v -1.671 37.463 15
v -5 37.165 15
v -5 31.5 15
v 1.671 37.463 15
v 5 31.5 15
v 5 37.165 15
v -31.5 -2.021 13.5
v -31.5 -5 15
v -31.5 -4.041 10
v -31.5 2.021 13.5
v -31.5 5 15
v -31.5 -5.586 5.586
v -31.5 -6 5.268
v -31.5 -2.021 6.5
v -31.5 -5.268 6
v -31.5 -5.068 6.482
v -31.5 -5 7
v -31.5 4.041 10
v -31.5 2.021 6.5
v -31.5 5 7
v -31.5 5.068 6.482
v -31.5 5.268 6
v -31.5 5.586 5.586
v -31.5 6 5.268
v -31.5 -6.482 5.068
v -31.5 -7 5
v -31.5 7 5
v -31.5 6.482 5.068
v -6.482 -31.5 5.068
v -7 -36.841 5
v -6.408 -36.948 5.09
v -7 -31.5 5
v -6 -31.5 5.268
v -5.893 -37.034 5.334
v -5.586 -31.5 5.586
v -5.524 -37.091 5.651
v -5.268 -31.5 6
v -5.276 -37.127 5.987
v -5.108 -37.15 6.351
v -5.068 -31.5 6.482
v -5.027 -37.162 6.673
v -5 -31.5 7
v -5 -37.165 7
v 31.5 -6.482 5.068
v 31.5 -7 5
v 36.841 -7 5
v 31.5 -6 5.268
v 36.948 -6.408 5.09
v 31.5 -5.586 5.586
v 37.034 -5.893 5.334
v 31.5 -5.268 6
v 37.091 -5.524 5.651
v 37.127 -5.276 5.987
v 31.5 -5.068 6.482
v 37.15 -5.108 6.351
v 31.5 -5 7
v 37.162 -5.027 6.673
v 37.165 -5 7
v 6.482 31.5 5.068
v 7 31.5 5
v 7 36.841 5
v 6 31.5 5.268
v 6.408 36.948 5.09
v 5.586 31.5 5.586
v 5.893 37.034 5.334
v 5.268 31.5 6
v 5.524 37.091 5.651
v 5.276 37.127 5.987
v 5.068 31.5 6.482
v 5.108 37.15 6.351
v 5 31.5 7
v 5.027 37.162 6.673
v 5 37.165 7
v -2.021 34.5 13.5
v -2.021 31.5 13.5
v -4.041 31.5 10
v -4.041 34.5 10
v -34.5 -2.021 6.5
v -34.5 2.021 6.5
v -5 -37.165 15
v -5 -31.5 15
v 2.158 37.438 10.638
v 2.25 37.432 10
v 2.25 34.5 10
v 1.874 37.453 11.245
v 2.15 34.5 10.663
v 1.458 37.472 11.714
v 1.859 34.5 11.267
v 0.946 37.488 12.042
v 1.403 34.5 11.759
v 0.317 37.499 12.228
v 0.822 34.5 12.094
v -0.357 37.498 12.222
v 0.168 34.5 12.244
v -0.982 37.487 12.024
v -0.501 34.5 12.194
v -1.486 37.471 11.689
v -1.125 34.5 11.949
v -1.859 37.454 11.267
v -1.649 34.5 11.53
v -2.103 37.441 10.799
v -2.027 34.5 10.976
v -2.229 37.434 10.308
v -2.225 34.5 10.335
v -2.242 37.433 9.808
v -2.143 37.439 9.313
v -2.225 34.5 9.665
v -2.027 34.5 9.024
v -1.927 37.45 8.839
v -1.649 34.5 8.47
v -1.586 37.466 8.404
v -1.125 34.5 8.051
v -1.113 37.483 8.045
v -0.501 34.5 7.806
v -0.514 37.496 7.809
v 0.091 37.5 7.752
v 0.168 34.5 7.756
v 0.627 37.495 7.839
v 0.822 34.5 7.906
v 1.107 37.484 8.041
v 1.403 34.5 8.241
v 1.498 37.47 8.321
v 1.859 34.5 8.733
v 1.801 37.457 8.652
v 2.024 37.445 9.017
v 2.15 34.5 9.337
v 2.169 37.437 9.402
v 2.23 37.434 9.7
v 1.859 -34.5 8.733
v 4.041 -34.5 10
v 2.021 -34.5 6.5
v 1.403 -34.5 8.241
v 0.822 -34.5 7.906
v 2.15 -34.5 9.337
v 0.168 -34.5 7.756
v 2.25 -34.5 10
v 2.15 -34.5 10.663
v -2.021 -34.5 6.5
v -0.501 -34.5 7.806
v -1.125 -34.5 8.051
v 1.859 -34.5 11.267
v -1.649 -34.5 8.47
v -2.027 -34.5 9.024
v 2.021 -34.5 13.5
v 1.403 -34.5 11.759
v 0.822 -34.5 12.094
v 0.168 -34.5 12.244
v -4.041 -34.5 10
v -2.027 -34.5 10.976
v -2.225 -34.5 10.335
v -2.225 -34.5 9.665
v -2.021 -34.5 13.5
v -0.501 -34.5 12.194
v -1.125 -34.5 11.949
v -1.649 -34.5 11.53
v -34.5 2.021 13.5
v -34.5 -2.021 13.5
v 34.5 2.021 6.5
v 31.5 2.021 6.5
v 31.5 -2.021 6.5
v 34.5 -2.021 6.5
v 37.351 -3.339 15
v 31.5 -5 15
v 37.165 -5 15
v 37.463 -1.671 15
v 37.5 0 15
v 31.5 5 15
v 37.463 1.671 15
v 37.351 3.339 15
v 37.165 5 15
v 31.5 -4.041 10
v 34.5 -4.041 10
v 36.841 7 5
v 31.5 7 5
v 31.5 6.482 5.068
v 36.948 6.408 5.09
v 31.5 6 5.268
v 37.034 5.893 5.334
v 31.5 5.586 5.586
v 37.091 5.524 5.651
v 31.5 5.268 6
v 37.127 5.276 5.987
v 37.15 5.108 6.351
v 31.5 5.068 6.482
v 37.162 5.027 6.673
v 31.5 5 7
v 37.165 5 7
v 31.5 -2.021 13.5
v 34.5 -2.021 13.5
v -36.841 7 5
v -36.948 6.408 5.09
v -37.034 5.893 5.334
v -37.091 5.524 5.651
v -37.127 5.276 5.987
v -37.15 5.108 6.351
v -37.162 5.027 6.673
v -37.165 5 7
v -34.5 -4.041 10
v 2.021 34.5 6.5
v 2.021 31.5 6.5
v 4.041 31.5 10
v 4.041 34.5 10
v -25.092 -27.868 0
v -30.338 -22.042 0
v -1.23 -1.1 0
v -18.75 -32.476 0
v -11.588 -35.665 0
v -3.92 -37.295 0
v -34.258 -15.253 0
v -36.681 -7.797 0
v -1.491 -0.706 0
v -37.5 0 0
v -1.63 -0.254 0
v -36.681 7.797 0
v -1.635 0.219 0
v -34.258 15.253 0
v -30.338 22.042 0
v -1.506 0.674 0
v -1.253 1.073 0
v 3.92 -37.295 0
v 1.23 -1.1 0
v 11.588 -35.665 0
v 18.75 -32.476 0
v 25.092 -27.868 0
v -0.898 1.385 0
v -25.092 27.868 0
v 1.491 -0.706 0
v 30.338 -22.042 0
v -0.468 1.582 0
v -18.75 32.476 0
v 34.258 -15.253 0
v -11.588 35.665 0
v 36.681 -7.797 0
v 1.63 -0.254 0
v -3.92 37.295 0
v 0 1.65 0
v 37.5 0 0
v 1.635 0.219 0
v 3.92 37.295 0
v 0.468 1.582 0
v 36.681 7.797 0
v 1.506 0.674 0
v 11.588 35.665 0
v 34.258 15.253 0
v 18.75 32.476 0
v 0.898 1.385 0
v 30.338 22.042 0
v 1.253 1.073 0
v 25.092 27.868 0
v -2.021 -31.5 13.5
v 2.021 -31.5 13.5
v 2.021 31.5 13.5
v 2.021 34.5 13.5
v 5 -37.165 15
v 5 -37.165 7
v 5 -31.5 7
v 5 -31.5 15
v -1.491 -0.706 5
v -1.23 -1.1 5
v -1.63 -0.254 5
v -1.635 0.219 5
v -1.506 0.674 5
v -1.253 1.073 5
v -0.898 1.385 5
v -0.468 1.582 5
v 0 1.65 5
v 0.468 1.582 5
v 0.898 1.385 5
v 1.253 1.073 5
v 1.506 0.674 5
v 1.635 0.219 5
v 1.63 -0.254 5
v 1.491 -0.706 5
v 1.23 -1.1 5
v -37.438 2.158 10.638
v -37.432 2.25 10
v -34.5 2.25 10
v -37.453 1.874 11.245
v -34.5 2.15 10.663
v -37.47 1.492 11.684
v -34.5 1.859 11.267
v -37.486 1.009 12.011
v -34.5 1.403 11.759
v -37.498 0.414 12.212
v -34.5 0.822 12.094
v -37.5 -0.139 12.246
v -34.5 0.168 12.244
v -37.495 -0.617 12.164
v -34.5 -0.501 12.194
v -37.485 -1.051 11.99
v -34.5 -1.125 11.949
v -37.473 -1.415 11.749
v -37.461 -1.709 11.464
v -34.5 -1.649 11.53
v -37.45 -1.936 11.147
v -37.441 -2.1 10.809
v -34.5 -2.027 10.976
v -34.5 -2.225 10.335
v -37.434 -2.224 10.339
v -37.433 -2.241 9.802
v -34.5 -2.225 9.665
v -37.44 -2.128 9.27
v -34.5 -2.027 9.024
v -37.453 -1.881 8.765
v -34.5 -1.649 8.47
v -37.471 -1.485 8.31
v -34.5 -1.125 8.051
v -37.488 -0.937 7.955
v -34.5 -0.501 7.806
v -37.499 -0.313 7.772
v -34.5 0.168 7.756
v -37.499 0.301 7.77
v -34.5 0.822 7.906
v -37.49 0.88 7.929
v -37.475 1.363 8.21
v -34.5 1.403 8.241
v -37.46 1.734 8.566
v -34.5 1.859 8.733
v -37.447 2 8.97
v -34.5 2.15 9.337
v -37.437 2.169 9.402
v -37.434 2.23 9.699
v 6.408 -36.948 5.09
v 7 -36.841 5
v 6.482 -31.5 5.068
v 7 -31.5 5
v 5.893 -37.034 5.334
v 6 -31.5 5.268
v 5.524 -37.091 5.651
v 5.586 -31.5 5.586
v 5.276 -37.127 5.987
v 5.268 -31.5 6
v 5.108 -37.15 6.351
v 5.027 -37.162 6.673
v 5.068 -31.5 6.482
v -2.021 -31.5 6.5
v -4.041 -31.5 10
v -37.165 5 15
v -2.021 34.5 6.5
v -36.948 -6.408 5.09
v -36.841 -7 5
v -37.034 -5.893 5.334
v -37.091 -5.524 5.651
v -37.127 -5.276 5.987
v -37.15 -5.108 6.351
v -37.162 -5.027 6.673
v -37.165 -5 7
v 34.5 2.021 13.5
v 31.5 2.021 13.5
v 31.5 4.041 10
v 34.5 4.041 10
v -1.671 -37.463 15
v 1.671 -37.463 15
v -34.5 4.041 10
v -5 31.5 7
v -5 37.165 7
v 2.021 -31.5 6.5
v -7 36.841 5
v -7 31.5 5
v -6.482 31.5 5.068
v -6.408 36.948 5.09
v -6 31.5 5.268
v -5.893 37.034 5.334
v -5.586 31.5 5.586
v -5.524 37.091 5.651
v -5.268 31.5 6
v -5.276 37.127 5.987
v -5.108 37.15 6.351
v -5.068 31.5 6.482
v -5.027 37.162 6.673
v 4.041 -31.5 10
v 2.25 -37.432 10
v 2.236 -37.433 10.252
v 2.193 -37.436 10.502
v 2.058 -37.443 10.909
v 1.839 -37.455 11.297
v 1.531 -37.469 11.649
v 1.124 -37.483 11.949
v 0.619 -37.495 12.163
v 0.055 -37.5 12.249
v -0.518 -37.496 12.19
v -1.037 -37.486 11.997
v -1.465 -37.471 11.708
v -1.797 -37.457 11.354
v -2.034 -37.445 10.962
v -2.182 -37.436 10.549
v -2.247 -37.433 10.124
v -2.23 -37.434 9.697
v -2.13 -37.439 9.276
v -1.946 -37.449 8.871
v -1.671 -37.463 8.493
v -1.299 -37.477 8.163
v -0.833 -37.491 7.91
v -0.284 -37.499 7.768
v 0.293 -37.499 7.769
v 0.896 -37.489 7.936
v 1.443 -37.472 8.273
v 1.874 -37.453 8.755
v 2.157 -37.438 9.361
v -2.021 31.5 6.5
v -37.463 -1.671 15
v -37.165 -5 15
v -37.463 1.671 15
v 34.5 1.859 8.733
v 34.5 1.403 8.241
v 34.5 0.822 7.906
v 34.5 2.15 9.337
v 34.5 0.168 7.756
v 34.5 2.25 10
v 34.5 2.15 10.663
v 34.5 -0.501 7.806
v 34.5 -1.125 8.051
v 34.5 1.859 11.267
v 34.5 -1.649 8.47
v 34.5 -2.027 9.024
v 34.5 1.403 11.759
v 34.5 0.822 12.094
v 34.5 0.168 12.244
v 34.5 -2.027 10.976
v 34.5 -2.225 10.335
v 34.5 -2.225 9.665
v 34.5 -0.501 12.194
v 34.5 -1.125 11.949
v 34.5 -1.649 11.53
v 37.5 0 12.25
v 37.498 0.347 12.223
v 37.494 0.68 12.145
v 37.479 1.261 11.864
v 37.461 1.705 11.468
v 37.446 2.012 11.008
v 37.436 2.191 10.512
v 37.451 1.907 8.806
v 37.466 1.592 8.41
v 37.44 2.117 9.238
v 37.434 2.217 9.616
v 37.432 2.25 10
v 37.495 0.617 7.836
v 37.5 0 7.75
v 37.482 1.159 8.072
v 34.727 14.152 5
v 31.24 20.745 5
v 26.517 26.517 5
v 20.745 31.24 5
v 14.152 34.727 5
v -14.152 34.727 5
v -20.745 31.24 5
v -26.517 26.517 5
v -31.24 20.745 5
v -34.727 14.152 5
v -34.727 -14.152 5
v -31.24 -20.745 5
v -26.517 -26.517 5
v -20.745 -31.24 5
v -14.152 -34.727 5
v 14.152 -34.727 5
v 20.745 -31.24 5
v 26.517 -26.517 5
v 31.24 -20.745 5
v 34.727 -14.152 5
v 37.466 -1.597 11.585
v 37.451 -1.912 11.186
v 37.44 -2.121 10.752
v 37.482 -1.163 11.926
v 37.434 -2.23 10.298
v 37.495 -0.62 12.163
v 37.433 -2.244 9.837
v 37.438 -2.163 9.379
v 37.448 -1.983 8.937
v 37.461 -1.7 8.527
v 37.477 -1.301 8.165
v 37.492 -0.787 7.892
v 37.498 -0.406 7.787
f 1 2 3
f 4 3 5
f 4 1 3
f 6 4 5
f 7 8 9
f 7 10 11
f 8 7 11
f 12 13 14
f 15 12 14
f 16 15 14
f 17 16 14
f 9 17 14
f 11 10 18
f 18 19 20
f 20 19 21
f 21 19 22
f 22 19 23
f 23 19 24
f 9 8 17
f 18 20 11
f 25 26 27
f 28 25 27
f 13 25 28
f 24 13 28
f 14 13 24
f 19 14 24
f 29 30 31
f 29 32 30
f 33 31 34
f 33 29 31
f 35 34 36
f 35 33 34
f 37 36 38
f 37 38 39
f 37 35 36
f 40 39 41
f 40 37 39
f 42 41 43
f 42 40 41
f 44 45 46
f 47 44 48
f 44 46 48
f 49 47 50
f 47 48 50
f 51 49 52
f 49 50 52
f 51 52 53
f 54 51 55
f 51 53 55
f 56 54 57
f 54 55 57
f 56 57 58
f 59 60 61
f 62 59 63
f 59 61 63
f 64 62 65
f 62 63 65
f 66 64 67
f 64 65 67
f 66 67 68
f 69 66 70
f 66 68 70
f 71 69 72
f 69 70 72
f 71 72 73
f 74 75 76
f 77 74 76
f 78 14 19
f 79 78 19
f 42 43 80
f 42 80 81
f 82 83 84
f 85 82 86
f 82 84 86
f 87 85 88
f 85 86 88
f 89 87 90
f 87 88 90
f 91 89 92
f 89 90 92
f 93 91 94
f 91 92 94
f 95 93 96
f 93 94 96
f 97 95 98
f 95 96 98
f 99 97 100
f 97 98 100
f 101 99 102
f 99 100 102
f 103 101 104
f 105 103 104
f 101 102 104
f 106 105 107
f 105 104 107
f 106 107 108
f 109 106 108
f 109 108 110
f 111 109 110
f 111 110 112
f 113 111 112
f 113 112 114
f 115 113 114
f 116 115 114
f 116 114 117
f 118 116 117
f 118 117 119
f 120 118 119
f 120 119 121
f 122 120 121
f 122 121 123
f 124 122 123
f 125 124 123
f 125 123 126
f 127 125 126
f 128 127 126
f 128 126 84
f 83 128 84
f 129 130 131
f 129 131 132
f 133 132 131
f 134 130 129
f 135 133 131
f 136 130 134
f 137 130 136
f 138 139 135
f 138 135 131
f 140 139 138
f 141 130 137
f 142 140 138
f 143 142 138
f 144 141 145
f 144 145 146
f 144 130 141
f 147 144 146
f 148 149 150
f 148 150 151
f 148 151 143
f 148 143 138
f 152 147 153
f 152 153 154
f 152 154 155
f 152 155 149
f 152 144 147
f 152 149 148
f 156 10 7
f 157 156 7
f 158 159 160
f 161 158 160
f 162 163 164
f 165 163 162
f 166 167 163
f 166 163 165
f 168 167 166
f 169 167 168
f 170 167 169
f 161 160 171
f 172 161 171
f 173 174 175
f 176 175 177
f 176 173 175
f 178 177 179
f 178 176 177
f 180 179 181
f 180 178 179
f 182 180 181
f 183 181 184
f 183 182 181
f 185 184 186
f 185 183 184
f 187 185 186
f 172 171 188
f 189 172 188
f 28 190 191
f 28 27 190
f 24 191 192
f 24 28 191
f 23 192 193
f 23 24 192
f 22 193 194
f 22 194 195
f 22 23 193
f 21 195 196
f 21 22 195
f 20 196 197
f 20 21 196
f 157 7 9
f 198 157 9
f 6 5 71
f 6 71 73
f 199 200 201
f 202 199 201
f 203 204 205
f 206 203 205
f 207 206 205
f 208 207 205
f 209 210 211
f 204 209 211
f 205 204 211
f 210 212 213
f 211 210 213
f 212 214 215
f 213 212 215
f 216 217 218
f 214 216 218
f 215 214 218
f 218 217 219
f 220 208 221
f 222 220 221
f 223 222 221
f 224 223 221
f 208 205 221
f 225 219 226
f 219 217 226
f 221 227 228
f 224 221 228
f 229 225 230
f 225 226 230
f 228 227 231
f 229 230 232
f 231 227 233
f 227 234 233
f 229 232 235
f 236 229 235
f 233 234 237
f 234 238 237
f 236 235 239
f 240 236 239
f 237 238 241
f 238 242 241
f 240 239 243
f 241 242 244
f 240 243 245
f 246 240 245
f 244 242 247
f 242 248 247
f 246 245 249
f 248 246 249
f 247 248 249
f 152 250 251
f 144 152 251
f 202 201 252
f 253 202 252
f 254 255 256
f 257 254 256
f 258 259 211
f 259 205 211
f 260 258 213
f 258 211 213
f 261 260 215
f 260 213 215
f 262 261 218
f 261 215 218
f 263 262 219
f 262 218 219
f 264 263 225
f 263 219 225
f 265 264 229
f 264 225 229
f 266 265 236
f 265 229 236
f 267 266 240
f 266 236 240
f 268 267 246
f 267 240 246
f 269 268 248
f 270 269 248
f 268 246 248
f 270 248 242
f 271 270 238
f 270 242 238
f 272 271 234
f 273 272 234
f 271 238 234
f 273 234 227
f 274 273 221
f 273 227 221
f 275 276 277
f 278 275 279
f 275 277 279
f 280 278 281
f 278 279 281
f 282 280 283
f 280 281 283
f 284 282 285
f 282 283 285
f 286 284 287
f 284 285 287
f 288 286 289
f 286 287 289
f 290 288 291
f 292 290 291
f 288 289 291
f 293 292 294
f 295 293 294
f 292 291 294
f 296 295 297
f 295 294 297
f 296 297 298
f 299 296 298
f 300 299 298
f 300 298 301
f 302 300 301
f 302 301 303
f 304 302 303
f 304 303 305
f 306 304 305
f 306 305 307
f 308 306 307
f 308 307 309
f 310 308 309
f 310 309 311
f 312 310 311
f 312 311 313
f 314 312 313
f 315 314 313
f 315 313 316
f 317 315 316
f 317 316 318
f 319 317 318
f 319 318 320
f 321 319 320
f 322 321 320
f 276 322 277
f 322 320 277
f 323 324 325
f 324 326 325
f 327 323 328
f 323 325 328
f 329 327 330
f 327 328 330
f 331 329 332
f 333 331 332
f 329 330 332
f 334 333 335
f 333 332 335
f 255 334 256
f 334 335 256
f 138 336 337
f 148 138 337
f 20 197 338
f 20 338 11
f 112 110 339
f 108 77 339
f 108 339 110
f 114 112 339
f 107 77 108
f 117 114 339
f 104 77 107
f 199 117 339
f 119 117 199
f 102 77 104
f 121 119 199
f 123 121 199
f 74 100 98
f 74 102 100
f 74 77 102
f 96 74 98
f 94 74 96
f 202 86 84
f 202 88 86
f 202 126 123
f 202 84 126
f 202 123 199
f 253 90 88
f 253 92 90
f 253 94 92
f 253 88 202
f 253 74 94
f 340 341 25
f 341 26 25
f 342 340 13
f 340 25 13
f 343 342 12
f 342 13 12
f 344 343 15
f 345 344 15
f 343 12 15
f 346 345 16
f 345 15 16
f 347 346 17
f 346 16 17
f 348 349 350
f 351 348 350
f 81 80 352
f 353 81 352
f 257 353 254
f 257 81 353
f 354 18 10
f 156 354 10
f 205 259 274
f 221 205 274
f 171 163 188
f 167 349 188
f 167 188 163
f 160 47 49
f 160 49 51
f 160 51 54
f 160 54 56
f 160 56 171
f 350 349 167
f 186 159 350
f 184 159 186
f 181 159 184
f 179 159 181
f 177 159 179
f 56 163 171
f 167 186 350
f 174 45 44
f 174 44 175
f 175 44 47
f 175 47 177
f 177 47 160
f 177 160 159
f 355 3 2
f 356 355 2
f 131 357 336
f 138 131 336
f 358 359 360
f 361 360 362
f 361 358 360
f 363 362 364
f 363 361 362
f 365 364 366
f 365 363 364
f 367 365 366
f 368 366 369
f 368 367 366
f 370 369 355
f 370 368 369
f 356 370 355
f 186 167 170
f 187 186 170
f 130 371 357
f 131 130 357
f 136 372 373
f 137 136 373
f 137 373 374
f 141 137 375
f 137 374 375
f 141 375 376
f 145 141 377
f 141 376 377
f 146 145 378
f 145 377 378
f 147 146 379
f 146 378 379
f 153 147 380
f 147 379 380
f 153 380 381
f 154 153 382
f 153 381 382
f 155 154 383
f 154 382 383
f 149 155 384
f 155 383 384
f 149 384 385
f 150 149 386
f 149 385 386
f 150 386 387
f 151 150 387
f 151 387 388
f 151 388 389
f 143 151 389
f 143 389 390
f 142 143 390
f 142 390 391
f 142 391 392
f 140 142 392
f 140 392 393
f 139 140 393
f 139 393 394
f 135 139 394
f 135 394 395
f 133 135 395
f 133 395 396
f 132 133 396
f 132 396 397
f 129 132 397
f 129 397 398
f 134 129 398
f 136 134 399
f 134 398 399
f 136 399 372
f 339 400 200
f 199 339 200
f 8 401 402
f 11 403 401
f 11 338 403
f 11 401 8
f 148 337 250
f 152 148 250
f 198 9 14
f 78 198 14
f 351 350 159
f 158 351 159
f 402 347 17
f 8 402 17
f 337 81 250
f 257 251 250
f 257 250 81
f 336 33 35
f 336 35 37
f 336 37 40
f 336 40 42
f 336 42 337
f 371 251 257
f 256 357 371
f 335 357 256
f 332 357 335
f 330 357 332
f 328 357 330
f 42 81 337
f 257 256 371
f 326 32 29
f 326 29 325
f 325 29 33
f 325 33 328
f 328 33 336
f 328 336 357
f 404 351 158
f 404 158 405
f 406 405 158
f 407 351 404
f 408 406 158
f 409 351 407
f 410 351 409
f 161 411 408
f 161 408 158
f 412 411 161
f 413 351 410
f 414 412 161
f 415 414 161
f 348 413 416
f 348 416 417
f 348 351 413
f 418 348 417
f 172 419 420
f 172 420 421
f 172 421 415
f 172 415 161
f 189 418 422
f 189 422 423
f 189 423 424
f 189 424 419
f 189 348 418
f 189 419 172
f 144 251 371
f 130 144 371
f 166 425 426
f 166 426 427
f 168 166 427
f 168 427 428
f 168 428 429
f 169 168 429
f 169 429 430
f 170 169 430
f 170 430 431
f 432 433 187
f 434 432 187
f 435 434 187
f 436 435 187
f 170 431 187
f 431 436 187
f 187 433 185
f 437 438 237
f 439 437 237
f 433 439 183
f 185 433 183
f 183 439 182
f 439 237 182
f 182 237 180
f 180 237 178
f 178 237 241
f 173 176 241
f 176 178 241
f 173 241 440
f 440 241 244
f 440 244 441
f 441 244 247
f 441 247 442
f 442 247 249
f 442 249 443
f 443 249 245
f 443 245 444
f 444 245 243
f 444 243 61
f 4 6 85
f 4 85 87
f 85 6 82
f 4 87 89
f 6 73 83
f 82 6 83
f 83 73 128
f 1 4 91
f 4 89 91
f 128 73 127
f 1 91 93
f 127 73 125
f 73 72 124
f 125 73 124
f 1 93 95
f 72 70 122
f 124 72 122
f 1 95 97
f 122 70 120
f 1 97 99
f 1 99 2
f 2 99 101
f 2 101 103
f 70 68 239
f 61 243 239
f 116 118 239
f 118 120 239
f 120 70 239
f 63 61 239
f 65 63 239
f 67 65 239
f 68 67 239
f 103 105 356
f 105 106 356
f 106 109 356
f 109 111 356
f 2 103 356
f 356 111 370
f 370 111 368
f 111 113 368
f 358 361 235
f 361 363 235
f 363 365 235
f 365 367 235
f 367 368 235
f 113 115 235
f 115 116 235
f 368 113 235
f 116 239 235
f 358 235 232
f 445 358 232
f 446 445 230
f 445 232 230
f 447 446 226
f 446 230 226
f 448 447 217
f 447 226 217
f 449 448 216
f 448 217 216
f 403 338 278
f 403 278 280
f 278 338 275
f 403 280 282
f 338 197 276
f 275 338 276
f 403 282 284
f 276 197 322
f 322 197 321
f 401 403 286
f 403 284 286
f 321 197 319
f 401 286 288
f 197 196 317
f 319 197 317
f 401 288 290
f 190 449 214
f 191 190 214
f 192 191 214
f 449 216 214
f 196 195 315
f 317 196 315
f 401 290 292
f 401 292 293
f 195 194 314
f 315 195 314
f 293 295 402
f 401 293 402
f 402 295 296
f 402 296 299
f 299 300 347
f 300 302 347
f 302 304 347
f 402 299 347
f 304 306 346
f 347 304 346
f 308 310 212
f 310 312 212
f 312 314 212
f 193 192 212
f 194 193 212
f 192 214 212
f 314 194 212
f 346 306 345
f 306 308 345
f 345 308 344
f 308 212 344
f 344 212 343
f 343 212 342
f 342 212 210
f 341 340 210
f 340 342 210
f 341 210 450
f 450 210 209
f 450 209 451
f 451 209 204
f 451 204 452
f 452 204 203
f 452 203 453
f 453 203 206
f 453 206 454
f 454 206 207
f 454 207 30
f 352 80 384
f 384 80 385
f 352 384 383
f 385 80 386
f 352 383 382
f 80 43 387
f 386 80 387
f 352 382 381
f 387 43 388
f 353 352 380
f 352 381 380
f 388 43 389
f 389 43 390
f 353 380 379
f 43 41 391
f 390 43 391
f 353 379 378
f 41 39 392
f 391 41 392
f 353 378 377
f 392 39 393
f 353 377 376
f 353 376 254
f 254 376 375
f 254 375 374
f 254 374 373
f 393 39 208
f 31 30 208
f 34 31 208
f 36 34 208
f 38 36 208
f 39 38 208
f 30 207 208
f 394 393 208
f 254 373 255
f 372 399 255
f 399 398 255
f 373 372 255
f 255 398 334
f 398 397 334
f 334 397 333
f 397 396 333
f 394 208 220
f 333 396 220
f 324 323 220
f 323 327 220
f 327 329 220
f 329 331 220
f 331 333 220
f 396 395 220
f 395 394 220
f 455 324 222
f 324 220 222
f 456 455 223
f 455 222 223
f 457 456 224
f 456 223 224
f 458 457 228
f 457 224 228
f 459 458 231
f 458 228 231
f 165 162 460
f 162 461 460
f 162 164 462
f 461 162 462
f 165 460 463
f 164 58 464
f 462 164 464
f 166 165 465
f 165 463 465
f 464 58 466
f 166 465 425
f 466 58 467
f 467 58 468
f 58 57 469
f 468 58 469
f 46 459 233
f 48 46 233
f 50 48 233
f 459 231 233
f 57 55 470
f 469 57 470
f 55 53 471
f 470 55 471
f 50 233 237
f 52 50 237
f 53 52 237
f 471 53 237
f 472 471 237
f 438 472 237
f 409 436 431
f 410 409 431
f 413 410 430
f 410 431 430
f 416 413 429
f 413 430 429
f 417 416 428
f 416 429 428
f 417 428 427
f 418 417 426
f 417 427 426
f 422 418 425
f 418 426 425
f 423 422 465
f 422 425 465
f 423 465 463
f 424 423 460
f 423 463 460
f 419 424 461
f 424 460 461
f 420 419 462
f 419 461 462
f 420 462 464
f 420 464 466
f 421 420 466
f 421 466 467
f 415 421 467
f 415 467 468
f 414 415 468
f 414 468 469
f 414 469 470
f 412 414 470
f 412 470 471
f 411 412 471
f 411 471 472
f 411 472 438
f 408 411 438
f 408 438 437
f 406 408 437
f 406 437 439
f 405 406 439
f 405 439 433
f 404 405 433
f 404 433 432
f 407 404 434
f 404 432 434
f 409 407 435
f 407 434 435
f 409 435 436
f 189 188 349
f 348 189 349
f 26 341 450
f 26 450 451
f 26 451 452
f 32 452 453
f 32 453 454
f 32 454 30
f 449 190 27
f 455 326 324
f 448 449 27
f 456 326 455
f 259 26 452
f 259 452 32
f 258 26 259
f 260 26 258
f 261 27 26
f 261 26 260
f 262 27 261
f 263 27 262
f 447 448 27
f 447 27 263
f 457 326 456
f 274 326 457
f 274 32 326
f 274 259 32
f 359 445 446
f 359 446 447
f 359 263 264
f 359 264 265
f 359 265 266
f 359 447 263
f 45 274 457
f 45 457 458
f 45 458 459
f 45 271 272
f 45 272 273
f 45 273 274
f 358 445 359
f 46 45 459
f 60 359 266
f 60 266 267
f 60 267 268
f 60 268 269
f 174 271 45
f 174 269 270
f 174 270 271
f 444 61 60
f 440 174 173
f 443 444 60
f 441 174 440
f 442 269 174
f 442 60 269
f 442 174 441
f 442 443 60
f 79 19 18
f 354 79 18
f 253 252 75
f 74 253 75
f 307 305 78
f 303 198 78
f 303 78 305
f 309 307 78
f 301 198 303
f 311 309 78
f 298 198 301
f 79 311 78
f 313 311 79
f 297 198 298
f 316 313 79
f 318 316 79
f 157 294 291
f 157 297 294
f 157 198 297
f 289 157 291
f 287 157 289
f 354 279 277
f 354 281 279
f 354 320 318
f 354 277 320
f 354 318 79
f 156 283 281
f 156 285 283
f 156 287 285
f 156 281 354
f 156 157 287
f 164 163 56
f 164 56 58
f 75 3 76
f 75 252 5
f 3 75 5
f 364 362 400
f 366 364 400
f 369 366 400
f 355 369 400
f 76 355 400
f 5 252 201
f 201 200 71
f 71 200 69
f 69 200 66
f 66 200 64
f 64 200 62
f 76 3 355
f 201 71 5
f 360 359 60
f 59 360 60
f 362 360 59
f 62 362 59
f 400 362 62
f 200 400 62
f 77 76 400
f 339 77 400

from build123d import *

# Parameters (mm, degrees)
SKETCH_R        = 37.5
PAD_DEPTH       = 5
SKETCH001_W     = 10
SKETCH001_H     = 6
SKETCH001_W_2   = 6
SKETCH001_H_2   = 10
PAD001_DEPTH    = 10
POCKET_DEPTH    = 3
POCKET001_DEPTH = 3
POCKET002_DEPTH = 3
POCKET003_DEPTH = 3
SKETCH006_R     = 2.25
POCKET004_DEPTH = 75
SKETCH007_R     = 2.25
POCKET005_DEPTH = 75
SKETCH008_R     = 1.65
POCKET006_DEPTH = 5
SKETCH009_W     = 2.756733
SKETCH009_H     = 1.311991
PAD002_DEPTH    = 5
SKETCH010_R     = 40
SKETCH010_R_2   = 37.5
POCKET007_DEPTH = 15
FILLET_R        = 2


with BuildPart() as part:
    # Sketch → Pad (new body)
    with BuildSketch(Plane.XY):
        Circle(SKETCH_R)
    extrude(amount=PAD_DEPTH)

    # Sketch001 (on Face3 of Pad) → Pad001 (join)
    with BuildSketch(Plane.XY.offset(5)):
        with Locations((0, 34.5)):
            Rectangle(SKETCH001_W, SKETCH001_H)
        with Locations((0, -34.5)):
            Rectangle(SKETCH001_W, SKETCH001_H)
        with Locations((-34.5, 0)):
            Rectangle(SKETCH001_W_2, SKETCH001_H_2)
        with Locations((34.5, 0)):
            Rectangle(SKETCH001_W_2, SKETCH001_H_2)
    extrude(amount=PAD001_DEPTH)

    # Sketch002 (on Face20 of Pad001) → Pocket (cut)
    with BuildSketch(Plane.YZ.offset(-31.5)):
        Polygon((4.041452, 10), (2.020726, 13.5), (-2.020726, 13.5), (-4.041452, 10), (-2.020726, 6.5), (2.020726, 6.5), align=None)
    extrude(amount=-POCKET_DEPTH, mode=Mode.SUBTRACT)

    # Sketch003 (on Face23 of Pocket) → Pocket001 (cut)
    with BuildSketch(Plane.XZ.offset(-31.5)):
        Polygon((4.041452, 10), (2.020726, 13.5), (-2.020726, 13.5), (-4.041452, 10), (-2.020726, 6.5), (2.020726, 6.5), align=None)
    extrude(amount=-POCKET001_DEPTH, mode=Mode.SUBTRACT)

    # Sketch004 (on Face15 of Pocket001) → Pocket002 (cut)
    with BuildSketch(Plane(origin=(31.5, 0, 0), x_dir=(0, -1, 0), z_dir=(-1, 0, 0))):
        Polygon((4.041452, 10), (2.020726, 13.5), (-2.020726, 13.5), (-4.041452, 10), (-2.020726, 6.5), (2.020726, 6.5), align=None)
    extrude(amount=-POCKET002_DEPTH, mode=Mode.SUBTRACT)

    # Sketch005 (on Face17 of Pocket002) → Pocket003 (cut)
    with BuildSketch(Plane(origin=(0, -31.5, 0), x_dir=(-1, 0, 0), z_dir=(0, 1, 0))):
        Polygon((4.041452, 10), (2.020726, 13.5), (-2.020726, 13.5), (-4.041452, 10), (-2.020726, 6.5), (2.020726, 6.5), align=None)
    extrude(amount=-POCKET003_DEPTH, mode=Mode.SUBTRACT)

    # Sketch006 (on Face12 of Pocket003) → Pocket004 (cut)
    with BuildSketch(Plane.YZ.offset(37.5)):
        with Locations((0, 10)):
            Circle(SKETCH006_R)
    extrude(amount=-POCKET004_DEPTH, mode=Mode.SUBTRACT)

    # Sketch007 (on Face25 of Pocket004) → Pocket005 (cut)
    with BuildSketch(Plane.XZ.offset(37.5)):
        with Locations((0, 10)):
            Circle(SKETCH007_R)
    extrude(amount=-POCKET005_DEPTH, mode=Mode.SUBTRACT)

    # Sketch008 (on Face2 of Pocket005) → Pocket006 (cut)
    with BuildSketch(Plane(origin=(0, 0, 0), x_dir=(1, 0, 0), z_dir=(0, 0, -1))):
        Circle(SKETCH008_R)
    extrude(amount=-POCKET006_DEPTH, mode=Mode.SUBTRACT)

    # Sketch009 (on Face2 of Pocket006) → Pad002 (join)
    with BuildSketch(Plane(origin=(0, 0, 0), x_dir=(1, 0, 0), z_dir=(0, 0, -1))):
        with Locations((-0.025144, 1.755996)):
            Rectangle(SKETCH009_W, SKETCH009_H)
    extrude(amount=-PAD002_DEPTH)

    # Sketch010 (on Face62 of Pad002) → Pocket007 (cut)
    with BuildSketch(Plane(origin=(0, 0, 0), x_dir=(1, 0, 0), z_dir=(0, 0, -1))):
        Circle(SKETCH010_R)
        Circle(SKETCH010_R_2, mode=Mode.SUBTRACT)
    extrude(amount=-POCKET007_DEPTH, mode=Mode.SUBTRACT)

    # Fillet
    fillet_edges = [part.edges().sort_by_distance(p)[0] for p in [
        (5, -34.332586, 5),
        (-5, -34.332586, 5),
        (-34.332586, -5, 5),
        (34.332586, -5, 5),
        (5, 34.332586, 5),
        (34.332586, 5, 5),
        (-34.332586, 5, 5),
        (-5, 34.332586, 5),
    ]]
    fillet(fillet_edges, radius=FILLET_R)


solid = part.part
